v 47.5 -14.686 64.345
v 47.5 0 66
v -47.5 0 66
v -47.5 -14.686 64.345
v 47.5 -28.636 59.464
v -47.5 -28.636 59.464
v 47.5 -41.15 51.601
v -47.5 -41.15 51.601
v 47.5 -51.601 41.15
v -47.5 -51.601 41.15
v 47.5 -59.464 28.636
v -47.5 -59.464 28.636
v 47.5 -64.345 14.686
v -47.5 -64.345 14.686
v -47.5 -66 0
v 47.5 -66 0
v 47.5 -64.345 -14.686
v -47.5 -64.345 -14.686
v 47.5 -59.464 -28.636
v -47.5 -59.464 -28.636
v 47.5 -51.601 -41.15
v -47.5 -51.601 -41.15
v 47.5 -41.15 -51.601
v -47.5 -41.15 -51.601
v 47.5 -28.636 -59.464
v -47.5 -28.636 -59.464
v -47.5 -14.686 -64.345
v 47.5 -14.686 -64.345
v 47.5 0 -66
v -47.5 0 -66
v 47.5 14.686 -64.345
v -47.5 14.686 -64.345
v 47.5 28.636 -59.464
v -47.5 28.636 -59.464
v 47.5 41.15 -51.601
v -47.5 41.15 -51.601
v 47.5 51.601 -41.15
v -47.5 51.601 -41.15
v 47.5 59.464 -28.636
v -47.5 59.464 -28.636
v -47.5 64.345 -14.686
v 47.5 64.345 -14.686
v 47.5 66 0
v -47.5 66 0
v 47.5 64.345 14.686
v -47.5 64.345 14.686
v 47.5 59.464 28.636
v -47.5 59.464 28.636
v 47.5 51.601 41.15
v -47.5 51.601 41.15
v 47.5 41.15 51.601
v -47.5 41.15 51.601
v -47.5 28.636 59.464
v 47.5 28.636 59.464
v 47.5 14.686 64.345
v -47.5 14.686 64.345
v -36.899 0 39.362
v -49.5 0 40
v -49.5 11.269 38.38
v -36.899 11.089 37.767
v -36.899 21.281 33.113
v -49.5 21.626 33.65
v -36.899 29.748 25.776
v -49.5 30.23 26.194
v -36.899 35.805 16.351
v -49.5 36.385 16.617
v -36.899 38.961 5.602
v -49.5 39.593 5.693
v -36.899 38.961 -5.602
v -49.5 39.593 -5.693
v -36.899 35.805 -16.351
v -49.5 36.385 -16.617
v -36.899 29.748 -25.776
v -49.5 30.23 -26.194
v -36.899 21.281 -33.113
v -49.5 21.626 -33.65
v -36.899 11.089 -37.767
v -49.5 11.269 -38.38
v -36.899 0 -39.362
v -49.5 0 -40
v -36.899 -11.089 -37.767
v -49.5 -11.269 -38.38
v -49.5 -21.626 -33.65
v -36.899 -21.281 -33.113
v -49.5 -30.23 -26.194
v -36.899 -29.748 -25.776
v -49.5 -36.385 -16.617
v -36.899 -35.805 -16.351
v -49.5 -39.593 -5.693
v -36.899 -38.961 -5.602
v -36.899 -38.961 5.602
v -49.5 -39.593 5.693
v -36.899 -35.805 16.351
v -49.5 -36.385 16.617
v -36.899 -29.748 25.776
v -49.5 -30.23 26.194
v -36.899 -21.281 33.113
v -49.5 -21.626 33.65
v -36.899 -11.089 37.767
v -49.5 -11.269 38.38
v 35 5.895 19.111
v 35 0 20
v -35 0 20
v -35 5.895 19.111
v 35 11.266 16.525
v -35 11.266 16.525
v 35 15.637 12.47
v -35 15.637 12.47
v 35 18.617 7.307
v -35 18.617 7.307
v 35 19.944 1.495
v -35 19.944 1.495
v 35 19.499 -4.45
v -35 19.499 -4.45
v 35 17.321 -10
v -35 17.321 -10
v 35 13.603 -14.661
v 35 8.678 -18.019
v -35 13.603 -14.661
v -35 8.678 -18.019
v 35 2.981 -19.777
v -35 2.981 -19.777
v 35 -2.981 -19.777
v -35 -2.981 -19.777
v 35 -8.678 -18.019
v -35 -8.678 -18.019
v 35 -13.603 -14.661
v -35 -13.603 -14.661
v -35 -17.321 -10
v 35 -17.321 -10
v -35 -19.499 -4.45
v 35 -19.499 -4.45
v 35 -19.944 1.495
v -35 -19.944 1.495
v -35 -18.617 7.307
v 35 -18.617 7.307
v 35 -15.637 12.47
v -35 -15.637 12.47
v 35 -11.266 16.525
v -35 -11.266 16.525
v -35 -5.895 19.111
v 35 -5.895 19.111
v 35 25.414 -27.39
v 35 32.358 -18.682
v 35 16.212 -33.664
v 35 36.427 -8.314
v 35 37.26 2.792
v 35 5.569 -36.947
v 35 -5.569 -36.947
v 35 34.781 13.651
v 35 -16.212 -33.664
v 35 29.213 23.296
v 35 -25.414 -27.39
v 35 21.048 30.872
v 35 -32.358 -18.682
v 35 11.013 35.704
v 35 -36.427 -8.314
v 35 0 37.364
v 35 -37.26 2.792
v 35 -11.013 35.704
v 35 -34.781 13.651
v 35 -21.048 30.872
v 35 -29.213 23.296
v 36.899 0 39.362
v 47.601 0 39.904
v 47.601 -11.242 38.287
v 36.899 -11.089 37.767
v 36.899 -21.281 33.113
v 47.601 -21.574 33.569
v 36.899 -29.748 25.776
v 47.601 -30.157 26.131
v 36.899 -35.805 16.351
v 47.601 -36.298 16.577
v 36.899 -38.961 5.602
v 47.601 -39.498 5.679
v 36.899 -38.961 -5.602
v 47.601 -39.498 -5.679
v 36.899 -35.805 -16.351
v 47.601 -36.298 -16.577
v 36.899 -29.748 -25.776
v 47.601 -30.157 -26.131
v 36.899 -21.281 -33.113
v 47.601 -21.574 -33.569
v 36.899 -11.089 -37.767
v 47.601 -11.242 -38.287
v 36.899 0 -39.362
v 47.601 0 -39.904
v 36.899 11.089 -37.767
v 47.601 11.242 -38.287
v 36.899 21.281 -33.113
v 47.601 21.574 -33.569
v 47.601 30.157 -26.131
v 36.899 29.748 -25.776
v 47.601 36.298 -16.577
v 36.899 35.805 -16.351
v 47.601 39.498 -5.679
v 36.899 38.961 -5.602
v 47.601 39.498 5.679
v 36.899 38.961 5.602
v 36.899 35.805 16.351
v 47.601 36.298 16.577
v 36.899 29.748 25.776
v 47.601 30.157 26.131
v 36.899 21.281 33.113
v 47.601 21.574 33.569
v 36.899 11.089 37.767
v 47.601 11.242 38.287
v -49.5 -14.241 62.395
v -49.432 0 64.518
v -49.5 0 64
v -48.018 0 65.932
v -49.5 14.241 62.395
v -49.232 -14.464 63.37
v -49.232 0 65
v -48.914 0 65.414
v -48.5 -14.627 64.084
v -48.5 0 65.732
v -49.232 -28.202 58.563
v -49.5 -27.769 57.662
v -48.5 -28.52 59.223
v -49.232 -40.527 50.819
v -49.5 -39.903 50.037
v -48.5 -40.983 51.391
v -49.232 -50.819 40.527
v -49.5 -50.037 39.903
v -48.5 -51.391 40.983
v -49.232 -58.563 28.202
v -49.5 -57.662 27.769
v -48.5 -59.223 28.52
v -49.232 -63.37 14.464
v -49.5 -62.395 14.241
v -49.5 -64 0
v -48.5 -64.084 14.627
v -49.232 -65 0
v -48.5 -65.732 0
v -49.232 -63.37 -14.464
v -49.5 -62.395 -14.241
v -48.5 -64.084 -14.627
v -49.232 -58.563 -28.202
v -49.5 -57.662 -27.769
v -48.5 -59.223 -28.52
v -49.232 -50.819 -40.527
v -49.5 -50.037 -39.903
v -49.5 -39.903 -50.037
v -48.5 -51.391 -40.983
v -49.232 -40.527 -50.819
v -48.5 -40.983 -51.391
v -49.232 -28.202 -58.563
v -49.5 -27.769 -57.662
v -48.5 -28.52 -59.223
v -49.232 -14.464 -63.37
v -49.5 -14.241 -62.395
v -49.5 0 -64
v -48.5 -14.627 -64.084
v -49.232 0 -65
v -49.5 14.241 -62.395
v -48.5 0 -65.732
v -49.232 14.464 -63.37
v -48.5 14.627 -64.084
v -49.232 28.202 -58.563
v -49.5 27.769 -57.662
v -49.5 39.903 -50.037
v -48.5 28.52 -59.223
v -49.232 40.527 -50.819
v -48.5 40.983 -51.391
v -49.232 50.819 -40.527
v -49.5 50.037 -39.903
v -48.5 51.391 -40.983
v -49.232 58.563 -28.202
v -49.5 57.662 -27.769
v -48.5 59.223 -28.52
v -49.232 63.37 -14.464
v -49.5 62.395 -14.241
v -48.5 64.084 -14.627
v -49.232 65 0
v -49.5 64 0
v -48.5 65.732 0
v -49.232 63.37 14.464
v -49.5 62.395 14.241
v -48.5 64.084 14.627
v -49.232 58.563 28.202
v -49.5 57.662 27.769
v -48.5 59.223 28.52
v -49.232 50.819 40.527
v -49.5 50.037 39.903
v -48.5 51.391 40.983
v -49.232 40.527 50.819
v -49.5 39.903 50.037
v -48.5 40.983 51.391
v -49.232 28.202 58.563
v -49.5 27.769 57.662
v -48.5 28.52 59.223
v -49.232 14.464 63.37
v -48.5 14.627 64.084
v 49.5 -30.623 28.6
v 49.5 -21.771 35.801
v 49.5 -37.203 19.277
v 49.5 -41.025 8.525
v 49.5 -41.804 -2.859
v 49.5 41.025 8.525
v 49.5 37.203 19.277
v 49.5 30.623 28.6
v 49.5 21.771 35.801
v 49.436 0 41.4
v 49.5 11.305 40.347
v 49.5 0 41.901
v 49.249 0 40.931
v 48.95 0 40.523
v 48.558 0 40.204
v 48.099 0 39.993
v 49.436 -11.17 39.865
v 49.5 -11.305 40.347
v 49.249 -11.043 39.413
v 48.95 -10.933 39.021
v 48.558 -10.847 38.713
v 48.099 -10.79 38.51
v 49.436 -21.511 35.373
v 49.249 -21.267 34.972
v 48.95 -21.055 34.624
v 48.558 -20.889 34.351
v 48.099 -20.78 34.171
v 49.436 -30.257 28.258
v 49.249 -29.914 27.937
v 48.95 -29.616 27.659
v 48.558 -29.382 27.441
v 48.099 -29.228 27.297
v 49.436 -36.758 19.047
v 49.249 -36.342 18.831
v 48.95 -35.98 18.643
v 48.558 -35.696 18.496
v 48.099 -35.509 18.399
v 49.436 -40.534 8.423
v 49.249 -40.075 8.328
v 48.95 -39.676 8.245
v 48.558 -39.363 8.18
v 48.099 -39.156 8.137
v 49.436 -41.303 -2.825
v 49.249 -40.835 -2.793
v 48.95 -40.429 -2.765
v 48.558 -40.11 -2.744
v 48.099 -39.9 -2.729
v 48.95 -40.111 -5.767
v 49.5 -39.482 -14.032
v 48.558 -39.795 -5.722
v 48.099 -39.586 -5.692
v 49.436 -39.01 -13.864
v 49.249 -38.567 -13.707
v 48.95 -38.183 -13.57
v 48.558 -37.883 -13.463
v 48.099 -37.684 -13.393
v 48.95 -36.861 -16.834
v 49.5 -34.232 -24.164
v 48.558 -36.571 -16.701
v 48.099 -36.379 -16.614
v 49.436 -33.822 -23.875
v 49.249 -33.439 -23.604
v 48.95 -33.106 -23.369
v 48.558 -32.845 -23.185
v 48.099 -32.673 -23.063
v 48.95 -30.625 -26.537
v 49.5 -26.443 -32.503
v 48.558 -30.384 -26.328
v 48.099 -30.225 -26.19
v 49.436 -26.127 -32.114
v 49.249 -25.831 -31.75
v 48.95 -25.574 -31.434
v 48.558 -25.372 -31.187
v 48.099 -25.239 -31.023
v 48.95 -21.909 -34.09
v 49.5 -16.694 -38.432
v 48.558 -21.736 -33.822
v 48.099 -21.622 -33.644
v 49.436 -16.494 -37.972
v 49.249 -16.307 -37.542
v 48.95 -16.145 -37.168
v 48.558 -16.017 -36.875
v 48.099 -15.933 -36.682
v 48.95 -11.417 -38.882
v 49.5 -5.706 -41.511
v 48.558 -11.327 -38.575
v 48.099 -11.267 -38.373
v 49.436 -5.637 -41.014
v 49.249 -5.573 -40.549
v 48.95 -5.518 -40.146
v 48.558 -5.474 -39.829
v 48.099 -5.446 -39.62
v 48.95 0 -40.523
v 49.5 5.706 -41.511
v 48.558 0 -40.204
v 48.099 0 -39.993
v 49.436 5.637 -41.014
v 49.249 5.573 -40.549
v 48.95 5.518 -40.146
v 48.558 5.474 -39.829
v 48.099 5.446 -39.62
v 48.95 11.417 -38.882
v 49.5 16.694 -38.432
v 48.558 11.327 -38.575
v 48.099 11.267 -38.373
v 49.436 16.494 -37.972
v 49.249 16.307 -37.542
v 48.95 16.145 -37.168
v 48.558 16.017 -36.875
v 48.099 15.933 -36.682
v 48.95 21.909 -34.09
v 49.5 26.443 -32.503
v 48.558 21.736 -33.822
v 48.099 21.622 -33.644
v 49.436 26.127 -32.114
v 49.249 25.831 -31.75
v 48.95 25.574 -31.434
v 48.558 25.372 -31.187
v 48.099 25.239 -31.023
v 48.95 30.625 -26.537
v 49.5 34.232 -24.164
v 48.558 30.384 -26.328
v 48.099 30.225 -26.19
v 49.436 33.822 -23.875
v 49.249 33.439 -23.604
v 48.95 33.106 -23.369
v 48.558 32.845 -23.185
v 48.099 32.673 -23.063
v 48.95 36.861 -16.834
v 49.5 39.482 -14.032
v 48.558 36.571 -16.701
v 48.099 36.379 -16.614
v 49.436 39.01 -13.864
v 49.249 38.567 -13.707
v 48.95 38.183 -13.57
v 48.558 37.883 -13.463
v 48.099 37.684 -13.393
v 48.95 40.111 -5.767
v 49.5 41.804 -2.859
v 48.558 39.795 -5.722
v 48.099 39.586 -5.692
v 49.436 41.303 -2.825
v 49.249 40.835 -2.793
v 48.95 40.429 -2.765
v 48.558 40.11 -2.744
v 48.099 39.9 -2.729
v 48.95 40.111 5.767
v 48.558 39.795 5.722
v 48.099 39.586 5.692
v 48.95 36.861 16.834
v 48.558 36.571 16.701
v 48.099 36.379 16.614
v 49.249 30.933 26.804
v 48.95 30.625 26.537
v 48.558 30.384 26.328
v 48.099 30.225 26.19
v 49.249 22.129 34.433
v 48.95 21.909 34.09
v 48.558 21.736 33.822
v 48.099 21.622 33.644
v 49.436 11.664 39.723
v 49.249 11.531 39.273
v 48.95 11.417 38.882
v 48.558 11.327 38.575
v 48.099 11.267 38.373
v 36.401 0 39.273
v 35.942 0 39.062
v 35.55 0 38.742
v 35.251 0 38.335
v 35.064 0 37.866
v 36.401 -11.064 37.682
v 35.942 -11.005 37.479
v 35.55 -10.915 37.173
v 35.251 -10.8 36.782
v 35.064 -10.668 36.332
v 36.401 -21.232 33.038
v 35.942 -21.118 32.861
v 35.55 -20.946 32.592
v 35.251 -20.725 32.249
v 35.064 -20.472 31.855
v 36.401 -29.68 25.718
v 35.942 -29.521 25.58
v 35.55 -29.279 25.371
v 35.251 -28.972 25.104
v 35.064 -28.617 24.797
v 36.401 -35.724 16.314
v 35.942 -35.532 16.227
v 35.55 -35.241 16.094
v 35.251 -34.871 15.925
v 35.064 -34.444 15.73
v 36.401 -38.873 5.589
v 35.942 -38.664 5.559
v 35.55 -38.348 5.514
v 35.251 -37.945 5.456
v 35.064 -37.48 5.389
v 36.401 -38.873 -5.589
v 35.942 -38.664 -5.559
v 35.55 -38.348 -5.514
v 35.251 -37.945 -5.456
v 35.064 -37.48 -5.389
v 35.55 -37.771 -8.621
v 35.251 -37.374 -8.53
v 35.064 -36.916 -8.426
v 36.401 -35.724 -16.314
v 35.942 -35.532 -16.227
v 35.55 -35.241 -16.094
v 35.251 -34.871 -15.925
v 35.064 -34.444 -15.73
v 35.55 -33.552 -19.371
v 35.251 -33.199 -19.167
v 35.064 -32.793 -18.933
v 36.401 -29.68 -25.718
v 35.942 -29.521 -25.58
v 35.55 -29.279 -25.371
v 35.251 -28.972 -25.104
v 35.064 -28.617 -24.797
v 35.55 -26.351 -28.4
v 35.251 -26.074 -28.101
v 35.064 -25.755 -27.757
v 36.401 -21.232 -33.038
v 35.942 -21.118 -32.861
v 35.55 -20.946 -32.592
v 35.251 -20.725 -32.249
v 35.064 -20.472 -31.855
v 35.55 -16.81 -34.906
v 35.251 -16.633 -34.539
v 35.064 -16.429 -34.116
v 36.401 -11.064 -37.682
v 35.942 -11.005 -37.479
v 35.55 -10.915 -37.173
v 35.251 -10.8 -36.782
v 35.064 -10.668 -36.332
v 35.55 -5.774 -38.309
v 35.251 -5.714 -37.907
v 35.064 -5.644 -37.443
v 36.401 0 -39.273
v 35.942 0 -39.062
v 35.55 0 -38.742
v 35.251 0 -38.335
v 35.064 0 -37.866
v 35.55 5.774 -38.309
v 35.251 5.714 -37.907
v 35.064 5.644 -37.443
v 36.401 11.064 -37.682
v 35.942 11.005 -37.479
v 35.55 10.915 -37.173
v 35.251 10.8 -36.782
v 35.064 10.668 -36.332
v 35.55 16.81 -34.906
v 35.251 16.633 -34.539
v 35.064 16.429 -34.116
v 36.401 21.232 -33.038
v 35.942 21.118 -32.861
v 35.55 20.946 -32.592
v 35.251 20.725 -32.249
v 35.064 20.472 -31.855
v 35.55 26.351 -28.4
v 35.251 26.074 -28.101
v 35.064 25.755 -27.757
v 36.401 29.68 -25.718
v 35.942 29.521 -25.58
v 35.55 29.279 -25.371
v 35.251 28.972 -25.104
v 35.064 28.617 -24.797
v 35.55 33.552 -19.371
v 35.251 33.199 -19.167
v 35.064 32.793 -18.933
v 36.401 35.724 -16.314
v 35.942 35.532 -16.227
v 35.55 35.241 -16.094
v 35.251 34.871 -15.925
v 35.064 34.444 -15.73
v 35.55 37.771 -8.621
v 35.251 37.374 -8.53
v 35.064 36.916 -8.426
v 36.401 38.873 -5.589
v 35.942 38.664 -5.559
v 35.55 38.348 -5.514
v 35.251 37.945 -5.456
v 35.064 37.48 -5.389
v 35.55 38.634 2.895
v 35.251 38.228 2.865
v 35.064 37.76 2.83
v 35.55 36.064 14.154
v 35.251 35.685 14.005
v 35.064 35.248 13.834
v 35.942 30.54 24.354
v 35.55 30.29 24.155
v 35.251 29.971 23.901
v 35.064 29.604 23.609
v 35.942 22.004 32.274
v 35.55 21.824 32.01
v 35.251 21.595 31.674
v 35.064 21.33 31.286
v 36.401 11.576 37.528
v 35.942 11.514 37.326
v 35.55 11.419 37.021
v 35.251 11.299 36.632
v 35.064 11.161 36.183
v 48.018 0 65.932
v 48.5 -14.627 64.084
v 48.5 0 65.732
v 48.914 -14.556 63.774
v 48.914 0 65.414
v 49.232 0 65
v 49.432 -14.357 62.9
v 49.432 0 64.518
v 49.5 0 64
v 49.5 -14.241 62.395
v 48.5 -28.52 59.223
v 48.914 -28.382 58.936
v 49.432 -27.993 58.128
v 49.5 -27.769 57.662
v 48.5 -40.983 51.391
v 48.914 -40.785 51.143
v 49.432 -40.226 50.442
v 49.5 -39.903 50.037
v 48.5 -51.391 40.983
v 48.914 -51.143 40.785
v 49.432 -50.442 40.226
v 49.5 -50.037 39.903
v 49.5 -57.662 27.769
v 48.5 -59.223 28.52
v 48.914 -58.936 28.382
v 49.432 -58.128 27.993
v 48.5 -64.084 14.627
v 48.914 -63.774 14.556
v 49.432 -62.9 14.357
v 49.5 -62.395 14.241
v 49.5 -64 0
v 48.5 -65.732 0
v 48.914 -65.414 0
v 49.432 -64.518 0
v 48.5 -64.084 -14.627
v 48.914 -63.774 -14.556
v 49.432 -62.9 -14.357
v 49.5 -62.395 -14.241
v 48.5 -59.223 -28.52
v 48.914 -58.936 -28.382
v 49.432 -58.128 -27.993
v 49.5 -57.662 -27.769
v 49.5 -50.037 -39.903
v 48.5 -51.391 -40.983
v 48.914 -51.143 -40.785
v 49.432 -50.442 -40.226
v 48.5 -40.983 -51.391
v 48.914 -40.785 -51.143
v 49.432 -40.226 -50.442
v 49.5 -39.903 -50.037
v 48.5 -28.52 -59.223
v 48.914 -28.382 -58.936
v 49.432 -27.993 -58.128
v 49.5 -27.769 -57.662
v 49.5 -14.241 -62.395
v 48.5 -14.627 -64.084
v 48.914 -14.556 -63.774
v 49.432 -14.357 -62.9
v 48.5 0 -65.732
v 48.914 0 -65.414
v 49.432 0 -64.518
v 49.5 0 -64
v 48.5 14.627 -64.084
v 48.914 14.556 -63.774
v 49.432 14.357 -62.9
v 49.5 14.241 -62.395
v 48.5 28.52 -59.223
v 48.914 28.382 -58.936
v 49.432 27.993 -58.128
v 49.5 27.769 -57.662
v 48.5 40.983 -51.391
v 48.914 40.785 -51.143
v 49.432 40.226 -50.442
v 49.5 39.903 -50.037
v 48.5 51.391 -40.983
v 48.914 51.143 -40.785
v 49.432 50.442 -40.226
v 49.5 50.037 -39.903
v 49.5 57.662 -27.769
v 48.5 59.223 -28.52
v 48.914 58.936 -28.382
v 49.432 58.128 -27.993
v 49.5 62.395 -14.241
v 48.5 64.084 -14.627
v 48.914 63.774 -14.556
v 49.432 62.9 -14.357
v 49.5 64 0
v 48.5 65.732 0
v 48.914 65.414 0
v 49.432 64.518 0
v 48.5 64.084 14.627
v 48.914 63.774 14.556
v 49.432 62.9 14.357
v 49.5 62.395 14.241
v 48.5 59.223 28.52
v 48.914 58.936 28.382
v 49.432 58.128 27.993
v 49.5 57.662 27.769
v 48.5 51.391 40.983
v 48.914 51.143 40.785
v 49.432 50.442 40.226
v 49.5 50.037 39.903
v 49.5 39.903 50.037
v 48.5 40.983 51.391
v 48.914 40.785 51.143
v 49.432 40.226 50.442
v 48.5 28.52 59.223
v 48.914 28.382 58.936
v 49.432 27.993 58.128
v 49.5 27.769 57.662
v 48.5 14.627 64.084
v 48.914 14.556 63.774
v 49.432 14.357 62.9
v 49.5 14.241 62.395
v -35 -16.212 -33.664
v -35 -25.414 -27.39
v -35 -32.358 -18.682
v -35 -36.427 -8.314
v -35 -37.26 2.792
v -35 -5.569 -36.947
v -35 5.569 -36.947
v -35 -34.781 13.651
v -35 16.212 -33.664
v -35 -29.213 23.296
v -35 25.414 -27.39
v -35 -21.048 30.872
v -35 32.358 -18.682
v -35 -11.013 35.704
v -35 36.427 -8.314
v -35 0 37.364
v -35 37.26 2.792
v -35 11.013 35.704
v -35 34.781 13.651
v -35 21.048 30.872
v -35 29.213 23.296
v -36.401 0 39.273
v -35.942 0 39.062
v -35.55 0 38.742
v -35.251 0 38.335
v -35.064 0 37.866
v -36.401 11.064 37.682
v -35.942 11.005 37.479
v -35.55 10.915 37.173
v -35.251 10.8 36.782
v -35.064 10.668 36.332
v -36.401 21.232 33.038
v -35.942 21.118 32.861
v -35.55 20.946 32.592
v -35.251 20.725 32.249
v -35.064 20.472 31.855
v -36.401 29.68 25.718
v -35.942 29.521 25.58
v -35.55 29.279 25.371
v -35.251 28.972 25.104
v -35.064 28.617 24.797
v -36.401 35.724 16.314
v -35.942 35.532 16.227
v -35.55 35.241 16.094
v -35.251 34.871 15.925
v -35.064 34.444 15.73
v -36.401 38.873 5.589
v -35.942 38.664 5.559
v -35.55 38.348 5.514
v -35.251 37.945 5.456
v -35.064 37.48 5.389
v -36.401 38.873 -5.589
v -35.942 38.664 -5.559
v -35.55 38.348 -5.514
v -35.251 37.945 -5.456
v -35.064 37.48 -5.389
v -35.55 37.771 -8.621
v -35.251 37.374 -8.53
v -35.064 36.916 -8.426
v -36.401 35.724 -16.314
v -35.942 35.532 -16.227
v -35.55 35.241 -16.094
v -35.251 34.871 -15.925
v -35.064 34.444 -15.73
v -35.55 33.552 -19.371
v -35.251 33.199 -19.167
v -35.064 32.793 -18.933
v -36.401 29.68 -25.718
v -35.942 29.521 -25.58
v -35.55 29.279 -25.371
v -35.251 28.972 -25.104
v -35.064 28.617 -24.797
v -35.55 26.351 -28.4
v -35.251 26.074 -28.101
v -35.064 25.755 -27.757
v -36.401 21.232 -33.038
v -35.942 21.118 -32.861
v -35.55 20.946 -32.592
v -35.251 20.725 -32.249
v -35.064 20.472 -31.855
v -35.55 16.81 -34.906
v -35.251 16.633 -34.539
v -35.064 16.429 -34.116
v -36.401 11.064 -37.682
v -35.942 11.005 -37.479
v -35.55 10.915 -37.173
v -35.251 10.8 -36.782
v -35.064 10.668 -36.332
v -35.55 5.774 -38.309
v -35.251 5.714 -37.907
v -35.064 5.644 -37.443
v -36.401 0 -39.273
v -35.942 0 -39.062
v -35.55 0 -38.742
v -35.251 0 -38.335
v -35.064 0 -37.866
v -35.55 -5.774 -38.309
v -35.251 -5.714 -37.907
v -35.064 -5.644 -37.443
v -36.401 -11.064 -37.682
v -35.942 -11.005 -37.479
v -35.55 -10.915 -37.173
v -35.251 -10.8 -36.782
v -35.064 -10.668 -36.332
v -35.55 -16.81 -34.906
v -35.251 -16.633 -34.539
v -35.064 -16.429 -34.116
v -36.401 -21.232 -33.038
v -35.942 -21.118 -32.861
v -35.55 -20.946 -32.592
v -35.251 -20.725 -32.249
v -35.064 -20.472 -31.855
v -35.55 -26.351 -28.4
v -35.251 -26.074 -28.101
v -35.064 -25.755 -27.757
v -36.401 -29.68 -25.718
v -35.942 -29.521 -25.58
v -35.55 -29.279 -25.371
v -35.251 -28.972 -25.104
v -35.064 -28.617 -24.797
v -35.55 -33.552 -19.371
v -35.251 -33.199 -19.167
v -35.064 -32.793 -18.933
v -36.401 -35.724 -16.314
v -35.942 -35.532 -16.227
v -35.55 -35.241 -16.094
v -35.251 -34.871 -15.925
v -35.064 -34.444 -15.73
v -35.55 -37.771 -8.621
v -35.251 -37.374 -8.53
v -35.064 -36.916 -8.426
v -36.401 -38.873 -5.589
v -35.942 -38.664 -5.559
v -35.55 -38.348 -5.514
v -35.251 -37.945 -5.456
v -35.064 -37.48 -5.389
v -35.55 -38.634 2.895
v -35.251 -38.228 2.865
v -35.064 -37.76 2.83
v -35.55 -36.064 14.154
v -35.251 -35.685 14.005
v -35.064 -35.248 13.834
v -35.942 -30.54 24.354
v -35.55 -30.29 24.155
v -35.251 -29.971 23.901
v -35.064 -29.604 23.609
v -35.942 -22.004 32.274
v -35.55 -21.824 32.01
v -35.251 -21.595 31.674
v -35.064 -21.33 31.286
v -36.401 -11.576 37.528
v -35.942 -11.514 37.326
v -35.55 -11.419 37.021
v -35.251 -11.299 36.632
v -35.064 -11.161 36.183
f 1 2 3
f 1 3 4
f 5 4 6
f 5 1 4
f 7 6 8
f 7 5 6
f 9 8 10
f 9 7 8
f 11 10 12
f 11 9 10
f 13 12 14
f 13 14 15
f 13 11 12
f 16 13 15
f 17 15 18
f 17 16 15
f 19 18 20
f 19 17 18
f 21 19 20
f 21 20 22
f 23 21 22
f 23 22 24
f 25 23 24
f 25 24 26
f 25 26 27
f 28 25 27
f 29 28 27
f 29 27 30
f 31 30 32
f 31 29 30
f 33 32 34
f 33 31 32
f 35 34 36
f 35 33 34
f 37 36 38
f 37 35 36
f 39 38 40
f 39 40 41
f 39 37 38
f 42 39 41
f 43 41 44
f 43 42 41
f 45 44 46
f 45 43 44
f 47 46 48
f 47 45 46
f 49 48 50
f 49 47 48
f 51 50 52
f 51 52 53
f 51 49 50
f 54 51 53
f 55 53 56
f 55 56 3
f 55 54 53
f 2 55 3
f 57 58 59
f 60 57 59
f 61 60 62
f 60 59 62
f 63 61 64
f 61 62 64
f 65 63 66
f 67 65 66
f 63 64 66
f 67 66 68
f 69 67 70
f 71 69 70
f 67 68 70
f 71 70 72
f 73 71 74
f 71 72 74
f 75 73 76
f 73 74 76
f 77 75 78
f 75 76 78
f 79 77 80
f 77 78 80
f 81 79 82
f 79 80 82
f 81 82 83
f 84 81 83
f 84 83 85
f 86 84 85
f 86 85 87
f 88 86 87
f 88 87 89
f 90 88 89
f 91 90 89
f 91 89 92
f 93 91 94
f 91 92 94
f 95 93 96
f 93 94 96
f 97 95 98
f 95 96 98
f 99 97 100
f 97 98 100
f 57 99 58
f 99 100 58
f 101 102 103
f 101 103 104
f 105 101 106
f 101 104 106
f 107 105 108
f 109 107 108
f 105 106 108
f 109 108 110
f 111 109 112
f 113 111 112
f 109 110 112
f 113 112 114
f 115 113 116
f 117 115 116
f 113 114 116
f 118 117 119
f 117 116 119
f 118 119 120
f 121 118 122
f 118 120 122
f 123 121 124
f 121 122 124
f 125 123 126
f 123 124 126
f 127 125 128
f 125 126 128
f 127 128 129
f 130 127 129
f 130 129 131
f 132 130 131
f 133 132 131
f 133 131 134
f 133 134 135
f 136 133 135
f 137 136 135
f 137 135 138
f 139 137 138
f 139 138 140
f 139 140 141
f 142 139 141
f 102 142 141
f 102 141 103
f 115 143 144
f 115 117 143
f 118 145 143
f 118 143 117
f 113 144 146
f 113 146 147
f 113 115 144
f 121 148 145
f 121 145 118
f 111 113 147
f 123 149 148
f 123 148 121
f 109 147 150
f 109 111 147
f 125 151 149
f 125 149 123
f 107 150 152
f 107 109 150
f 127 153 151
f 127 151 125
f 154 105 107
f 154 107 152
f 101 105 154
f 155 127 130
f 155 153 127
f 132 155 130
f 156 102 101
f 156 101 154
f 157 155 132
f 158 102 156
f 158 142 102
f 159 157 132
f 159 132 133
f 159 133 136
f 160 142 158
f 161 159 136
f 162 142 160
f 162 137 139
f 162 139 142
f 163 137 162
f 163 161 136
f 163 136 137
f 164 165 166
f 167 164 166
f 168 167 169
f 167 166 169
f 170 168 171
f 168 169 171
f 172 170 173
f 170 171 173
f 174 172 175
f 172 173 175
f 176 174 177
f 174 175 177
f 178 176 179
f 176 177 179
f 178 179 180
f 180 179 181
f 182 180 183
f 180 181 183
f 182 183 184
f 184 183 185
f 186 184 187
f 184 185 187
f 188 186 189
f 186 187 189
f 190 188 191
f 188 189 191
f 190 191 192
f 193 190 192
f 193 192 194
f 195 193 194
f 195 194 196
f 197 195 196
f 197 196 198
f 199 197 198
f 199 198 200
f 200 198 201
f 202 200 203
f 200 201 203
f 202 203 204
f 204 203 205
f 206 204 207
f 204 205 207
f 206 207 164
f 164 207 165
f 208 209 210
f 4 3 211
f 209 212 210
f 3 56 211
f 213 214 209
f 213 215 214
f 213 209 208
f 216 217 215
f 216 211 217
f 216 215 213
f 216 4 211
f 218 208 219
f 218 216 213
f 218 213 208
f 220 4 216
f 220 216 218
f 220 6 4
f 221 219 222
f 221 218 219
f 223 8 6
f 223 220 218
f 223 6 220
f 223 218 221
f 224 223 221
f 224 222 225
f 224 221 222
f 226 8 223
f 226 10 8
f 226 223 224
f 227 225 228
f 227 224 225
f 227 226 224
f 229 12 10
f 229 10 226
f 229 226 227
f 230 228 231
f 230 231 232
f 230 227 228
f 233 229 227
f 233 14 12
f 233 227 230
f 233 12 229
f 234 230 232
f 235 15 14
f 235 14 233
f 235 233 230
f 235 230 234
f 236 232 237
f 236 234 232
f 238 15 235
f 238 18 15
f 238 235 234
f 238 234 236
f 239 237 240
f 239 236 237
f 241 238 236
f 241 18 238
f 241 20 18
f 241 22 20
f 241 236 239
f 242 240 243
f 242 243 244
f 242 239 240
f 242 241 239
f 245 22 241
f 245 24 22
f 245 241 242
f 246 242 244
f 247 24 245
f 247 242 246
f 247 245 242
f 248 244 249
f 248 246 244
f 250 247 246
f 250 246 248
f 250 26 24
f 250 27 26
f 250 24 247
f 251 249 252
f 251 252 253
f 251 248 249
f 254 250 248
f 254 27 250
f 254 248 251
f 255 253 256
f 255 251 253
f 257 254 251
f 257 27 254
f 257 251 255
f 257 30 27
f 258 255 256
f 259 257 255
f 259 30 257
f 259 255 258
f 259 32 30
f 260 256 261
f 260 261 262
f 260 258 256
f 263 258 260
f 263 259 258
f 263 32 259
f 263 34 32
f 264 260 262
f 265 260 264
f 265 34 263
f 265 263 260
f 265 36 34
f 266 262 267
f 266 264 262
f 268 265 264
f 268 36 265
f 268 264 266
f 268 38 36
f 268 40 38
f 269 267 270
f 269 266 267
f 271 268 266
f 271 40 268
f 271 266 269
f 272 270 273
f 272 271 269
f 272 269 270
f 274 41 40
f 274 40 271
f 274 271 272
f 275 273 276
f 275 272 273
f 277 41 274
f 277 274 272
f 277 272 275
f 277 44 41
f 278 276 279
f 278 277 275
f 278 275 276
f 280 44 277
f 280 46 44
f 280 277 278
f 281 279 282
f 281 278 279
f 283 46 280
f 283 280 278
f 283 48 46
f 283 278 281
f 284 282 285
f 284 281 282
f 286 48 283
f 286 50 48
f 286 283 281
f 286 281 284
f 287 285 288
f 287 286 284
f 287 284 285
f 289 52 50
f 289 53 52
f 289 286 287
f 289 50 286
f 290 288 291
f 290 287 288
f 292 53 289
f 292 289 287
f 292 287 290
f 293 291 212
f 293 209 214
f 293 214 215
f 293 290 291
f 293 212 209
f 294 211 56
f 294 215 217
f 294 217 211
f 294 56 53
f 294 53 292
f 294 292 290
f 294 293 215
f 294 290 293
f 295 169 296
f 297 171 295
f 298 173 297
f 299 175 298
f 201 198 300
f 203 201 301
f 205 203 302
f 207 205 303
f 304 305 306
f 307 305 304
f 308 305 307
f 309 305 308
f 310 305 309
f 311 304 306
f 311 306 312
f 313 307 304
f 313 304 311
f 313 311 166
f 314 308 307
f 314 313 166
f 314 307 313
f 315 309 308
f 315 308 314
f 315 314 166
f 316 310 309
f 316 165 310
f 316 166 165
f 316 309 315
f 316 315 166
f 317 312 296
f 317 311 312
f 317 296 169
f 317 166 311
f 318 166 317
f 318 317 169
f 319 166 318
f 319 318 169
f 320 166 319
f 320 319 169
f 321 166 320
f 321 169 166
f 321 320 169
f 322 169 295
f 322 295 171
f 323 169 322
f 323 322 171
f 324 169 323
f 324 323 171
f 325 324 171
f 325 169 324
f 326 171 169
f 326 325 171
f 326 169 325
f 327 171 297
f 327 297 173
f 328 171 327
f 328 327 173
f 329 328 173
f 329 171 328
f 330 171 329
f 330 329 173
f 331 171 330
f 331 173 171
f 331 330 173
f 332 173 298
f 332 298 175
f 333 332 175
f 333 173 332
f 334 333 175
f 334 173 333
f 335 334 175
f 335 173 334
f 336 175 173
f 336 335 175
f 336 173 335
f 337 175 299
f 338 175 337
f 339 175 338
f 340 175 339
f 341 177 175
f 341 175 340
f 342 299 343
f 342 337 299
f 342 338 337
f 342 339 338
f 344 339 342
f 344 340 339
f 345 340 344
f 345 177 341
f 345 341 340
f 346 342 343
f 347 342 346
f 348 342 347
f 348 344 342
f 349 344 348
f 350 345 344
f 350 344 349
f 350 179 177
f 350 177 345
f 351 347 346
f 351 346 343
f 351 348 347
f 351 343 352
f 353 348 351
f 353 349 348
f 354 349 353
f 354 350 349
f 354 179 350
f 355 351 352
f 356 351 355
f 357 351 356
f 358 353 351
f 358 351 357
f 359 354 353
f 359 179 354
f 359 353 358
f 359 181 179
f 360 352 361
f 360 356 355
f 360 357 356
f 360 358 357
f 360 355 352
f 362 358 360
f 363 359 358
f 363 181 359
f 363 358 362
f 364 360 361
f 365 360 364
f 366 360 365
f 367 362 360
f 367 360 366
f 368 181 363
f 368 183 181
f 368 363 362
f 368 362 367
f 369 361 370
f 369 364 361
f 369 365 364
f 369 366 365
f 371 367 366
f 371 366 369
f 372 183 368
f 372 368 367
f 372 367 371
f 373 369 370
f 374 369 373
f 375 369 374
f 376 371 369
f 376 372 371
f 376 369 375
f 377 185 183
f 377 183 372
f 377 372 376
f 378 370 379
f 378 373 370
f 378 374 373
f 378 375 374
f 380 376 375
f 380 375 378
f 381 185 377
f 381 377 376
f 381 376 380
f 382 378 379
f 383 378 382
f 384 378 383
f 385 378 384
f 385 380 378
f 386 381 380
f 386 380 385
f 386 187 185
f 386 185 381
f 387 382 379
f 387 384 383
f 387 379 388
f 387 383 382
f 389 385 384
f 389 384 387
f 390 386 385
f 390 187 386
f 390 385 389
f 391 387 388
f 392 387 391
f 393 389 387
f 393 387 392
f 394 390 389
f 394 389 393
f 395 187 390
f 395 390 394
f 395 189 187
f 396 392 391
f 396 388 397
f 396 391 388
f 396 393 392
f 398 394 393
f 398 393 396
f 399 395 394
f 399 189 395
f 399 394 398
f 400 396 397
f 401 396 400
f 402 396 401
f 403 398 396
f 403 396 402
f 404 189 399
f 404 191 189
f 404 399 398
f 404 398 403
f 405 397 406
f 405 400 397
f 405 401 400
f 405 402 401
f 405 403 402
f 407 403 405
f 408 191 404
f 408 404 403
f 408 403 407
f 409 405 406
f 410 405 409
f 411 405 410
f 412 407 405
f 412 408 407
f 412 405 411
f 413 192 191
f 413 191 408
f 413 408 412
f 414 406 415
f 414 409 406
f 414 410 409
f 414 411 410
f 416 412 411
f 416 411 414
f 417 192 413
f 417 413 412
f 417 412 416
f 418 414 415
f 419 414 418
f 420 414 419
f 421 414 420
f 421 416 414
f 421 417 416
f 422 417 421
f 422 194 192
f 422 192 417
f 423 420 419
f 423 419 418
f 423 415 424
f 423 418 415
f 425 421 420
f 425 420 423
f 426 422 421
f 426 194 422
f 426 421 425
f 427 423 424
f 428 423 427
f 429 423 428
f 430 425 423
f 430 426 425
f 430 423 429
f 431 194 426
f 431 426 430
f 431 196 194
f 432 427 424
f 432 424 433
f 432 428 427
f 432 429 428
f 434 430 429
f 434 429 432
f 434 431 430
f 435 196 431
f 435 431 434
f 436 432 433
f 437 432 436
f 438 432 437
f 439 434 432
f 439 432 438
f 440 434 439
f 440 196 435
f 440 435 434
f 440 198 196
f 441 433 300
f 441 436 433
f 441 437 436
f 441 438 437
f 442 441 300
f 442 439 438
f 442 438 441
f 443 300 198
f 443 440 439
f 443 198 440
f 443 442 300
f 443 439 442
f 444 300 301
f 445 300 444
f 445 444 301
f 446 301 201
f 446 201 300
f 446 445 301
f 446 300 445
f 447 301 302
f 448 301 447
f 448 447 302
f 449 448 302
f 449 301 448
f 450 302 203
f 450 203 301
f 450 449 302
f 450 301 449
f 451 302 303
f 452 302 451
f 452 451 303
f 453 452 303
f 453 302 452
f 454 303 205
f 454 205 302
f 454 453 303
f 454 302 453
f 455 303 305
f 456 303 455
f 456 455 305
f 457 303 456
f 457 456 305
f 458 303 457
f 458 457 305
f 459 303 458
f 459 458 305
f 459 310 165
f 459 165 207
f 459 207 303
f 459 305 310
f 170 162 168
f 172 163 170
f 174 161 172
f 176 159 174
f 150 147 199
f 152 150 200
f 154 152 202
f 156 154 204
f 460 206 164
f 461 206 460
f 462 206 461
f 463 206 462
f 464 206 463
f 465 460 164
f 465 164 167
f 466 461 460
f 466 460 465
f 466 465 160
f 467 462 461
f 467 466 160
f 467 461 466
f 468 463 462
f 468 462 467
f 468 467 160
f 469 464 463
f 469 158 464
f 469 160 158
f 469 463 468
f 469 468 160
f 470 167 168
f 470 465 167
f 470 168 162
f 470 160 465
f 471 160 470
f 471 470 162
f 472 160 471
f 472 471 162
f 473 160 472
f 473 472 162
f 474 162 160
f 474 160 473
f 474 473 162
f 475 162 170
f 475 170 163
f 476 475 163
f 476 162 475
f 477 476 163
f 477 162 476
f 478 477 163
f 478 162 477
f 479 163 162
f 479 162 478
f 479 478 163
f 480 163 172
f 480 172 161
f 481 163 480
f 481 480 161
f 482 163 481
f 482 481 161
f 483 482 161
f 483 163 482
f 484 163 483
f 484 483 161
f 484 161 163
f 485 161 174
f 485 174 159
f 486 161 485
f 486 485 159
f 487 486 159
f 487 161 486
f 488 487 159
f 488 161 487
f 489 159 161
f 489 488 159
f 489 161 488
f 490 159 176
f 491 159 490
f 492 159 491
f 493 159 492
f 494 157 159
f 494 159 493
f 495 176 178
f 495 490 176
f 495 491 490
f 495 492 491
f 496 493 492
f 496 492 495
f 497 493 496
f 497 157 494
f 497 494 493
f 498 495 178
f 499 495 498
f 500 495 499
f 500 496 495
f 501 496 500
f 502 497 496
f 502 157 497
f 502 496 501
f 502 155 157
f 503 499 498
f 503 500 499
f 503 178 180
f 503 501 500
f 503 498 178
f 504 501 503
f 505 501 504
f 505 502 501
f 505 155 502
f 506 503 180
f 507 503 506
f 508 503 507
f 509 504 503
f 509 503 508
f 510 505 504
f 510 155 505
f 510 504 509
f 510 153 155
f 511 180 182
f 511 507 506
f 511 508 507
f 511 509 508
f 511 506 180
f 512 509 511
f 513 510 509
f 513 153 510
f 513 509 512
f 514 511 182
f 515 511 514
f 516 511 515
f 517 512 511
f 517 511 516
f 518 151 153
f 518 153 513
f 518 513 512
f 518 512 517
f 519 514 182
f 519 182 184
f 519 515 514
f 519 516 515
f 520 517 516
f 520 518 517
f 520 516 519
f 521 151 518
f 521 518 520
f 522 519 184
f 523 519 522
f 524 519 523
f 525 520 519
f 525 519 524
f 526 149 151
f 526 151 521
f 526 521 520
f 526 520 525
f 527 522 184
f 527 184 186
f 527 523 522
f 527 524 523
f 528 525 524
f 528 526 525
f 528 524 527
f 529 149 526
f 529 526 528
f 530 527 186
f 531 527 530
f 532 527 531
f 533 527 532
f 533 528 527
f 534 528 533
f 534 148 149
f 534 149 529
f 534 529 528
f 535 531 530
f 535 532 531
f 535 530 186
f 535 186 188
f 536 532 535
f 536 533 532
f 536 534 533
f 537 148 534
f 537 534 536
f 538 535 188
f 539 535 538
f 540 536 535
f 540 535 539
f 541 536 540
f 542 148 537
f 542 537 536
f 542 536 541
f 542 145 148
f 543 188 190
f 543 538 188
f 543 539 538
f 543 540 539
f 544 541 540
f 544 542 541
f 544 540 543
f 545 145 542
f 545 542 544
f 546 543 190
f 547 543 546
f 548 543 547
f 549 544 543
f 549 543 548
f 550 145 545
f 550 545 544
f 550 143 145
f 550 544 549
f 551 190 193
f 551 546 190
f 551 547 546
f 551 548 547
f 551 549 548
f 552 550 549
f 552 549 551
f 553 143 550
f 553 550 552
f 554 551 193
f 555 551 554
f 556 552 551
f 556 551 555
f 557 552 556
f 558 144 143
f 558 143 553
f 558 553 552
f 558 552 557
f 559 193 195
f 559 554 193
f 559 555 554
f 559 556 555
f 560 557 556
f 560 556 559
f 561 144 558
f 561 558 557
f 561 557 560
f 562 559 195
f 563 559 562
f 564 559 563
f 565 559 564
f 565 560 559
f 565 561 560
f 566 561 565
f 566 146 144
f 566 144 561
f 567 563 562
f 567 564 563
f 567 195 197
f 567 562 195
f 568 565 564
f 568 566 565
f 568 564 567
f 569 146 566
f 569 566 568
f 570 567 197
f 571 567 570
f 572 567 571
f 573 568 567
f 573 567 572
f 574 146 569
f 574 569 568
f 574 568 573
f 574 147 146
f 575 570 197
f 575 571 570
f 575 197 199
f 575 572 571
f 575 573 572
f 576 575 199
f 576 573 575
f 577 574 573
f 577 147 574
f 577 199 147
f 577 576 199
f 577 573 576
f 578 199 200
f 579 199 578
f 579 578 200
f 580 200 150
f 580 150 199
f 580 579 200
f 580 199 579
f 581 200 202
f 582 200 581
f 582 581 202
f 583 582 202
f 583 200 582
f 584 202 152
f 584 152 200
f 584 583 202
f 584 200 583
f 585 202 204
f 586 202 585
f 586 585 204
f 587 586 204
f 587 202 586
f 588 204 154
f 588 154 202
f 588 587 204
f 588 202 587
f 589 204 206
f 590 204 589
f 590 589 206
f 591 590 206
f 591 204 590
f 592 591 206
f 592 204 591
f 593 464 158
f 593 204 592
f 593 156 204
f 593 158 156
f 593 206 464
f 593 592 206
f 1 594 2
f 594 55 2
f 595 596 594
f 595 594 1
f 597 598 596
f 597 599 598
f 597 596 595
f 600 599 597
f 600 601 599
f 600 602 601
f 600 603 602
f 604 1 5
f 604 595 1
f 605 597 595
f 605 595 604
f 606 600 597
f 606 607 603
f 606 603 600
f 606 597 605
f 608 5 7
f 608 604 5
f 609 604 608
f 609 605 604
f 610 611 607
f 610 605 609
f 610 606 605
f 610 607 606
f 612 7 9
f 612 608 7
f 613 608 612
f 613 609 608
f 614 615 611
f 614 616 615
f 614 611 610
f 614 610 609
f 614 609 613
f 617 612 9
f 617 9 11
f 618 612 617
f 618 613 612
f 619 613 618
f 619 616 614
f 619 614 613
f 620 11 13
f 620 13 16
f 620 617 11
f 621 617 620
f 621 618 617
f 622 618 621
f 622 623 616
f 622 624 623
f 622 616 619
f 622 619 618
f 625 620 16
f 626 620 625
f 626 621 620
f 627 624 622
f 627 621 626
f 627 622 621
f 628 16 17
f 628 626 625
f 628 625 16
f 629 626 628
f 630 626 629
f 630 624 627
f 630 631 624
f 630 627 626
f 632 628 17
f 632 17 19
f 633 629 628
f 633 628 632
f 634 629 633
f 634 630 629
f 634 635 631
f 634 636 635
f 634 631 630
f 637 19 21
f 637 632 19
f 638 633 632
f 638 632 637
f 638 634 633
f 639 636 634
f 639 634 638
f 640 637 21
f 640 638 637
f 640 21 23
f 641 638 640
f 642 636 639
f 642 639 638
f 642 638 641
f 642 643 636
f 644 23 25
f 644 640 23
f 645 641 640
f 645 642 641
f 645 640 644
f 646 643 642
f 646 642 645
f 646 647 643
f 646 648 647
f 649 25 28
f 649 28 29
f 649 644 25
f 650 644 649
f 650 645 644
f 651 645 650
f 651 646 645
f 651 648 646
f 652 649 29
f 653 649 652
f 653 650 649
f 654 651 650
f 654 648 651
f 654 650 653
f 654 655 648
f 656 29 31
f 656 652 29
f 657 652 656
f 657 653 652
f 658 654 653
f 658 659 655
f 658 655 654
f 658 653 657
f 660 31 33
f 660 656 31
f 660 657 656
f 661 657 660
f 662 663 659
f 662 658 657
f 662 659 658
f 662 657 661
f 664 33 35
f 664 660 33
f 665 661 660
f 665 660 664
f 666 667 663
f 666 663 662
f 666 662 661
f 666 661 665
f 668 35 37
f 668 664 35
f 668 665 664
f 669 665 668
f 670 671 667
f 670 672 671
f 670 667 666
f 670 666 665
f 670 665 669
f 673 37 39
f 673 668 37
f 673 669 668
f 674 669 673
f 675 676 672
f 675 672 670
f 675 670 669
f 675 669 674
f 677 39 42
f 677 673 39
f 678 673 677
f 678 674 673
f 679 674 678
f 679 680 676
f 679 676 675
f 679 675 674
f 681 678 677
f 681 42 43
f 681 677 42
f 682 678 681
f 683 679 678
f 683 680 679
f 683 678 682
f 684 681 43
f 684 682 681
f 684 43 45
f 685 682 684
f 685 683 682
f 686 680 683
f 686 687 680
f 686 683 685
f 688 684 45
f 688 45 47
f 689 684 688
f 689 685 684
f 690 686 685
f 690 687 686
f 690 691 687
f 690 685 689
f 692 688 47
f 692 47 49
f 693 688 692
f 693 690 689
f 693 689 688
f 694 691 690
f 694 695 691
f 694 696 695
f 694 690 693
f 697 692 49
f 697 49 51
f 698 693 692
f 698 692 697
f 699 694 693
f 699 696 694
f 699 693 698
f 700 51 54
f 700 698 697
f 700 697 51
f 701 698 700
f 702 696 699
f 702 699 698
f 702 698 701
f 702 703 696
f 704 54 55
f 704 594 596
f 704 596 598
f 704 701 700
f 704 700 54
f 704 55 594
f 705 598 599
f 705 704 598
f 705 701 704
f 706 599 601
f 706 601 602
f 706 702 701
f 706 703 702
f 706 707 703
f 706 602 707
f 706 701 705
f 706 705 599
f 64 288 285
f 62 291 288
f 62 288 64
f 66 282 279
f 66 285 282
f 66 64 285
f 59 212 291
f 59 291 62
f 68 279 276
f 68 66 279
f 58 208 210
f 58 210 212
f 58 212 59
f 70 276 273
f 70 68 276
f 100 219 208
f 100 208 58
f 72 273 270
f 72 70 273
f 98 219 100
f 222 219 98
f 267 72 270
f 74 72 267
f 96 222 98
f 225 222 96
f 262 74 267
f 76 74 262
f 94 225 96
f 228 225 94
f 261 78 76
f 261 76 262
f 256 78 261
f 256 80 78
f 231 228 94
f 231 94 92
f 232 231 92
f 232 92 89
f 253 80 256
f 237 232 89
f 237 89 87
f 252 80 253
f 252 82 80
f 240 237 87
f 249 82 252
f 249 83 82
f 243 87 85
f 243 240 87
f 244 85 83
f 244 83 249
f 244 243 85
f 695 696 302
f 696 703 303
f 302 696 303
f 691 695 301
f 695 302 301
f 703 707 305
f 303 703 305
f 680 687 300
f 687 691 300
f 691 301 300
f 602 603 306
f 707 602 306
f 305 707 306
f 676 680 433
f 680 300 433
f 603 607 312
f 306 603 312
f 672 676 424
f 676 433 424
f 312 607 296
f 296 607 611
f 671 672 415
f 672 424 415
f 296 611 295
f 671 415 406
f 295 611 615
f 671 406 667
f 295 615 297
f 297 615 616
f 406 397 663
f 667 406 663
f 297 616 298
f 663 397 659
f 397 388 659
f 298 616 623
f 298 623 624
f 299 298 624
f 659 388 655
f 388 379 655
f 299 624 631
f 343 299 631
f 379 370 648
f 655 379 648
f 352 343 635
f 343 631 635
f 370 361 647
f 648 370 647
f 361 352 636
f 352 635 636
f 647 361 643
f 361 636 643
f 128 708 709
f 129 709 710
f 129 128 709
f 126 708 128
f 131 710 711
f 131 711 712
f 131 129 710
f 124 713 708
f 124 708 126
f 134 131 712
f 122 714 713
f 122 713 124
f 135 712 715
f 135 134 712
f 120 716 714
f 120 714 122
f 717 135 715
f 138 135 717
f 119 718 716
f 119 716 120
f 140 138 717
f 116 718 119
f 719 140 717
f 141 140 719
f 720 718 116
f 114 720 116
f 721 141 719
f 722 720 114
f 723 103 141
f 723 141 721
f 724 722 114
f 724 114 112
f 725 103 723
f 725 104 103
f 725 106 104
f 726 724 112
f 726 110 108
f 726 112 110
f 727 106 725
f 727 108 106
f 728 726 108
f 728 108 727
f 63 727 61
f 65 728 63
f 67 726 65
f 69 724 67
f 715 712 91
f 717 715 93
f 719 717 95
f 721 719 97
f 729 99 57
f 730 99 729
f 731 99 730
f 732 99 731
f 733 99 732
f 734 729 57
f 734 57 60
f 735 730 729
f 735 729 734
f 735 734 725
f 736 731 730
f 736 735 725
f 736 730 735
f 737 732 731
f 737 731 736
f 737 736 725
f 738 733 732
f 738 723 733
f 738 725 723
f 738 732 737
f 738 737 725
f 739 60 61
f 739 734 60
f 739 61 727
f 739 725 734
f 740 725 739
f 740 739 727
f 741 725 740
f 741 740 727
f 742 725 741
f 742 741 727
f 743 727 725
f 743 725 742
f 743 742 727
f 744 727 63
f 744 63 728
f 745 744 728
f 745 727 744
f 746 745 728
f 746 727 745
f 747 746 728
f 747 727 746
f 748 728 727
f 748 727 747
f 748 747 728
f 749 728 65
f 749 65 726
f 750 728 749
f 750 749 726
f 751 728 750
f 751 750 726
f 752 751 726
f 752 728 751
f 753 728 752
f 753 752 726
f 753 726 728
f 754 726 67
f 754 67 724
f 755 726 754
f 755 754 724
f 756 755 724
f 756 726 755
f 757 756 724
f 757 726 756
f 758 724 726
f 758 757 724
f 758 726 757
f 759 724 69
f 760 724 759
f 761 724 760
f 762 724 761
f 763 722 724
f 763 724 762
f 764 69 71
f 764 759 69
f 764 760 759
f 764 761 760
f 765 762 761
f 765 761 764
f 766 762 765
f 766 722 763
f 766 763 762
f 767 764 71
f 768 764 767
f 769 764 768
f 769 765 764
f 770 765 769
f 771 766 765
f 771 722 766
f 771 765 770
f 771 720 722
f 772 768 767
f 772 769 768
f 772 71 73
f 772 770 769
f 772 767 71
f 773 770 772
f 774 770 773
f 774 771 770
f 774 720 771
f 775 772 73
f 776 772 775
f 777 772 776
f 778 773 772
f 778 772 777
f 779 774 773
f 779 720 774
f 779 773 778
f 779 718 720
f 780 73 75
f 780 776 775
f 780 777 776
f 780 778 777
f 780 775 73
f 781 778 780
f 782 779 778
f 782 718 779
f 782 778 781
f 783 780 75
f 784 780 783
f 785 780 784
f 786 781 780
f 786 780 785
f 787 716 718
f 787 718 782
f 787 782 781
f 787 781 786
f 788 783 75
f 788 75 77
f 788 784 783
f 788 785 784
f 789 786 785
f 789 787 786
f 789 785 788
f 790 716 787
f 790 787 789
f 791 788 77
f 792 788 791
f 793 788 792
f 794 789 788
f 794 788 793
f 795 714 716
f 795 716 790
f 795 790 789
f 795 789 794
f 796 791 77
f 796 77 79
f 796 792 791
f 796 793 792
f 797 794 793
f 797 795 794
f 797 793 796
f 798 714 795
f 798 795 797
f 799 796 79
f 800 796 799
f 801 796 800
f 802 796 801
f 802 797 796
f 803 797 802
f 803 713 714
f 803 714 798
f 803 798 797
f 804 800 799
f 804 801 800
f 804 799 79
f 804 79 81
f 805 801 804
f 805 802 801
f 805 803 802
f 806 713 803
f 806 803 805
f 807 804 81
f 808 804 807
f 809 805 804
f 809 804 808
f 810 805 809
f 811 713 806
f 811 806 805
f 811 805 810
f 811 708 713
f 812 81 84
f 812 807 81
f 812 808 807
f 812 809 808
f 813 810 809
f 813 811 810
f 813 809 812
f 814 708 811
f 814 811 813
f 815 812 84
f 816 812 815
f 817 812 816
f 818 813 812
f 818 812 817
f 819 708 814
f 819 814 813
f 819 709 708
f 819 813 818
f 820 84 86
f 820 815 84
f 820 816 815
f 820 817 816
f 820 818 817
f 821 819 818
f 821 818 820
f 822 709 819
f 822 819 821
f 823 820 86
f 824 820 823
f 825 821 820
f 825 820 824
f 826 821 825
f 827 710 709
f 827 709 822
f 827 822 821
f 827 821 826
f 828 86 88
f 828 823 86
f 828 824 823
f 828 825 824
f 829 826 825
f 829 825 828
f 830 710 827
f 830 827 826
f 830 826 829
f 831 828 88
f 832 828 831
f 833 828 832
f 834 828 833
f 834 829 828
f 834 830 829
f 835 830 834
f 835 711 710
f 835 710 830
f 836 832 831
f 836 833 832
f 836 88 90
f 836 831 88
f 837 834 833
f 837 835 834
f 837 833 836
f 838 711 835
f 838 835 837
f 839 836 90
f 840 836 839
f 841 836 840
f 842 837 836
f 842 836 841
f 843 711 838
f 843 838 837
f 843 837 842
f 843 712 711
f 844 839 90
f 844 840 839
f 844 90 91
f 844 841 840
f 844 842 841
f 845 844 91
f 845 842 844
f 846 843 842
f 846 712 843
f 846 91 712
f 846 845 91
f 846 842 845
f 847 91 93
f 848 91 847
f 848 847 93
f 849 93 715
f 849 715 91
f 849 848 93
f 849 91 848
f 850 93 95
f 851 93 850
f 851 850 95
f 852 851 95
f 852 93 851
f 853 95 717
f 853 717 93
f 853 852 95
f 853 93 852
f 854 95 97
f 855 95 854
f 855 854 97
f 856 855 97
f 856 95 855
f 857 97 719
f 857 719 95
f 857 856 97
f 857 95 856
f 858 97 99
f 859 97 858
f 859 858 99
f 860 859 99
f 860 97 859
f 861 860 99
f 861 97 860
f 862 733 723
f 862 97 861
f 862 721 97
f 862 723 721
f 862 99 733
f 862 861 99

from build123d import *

# Parameters (mm, degrees)
SKETCH_1_W               = 99
SKETCH_1_H               = 66
SKETCH_2_R               = 40
CUT_EXTRUDE_1_DEPTH      = 14.5
CUT_EXTRUDE_1_DRAFT      = -2.9
MIRROR_1_COPY_1_SKETCH_R = 40
MIRROR_1_COPY_1_DEPTH    = 14.5
MIRROR_1_COPY_1_DRAFT    = -2.9
FILLET_1_R               = 2
SKETCH_3_R               = 20
CUT_EXTRUDE_2_DEPTH      = 100


with BuildPart() as part:
    # 草图1 → 旋转2 (revolve)
    with BuildSketch(Plane.XY):
        with Locations((0, 33)):
            Rectangle(SKETCH_1_W, SKETCH_1_H)
    revolve(axis=Axis((-49.5, 0, 0), (1, 0, 0)))


with BuildPart() as cut_extrude_1_tool:
    # 草图2 → 切除-拉伸1 (with draft: the straight prism first)
    with BuildSketch(Plane.ZY.offset(49.5)):
        Circle(SKETCH_2_R)
    extrude(amount=-CUT_EXTRUDE_1_DEPTH)
    # 切除-拉伸1: the draft: its side faces are tilted about the plane it starts from
    cut_extrude_1_sides = [cut_extrude_1_tool.faces().sort_by_distance(p)[0] for p in [
        (-42.25, 0, -40),
    ]]
    draft(cut_extrude_1_sides, Plane.ZY.offset(49.5), CUT_EXTRUDE_1_DRAFT)


with BuildPart() as part_1:
    add(part.part)

    # 切除-拉伸1: cut by cut_extrude_1_tool
    add(cut_extrude_1_tool.part, mode=Mode.SUBTRACT)


with BuildPart() as mirror_1_copy_1_tool:
    # 镜向1 copy 1 sketch → 镜向1 copy 1 (with draft: the straight prism first)
    with BuildSketch(Plane(origin=(49.5, 0, 0), x_dir=(0, 0, 1), z_dir=(1, 0, 0))):
        Circle(MIRROR_1_COPY_1_SKETCH_R)
    extrude(amount=-MIRROR_1_COPY_1_DEPTH)
    # 镜向1 copy 1: the draft: its side faces are tilted about the plane it starts from
    mirror_1_copy_1_sides = [mirror_1_copy_1_tool.faces().sort_by_distance(p)[0] for p in [
        (42.25, 0, -40),
    ]]
    draft(mirror_1_copy_1_sides, Plane(origin=(49.5, 0, 0), x_dir=(0, 0, 1), z_dir=(1, 0, 0)), MIRROR_1_COPY_1_DRAFT)


with BuildPart() as part_2:
    add(part_1.part)

    # 镜向1 copy 1: cut by mirror_1_copy_1_tool
    add(mirror_1_copy_1_tool.part, mode=Mode.SUBTRACT)

    # 圆角1
    fillet_1_edges = [part_2.edges().sort_by_distance(p)[0] for p in [
        (-49.5, -66, 0),
        (35, 0, -39.265461688),
        (49.5, 0, -40),
        (49.5, -66, 0),
        (-35, 0, -39.265461688),
    ]]
    fillet(fillet_1_edges, radius=FILLET_1_R)

    # 草图3 → 切除-拉伸2 (cut)
    with BuildSketch(Plane.ZY.offset(35)):
        Circle(SKETCH_3_R)
    extrude(amount=-CUT_EXTRUDE_2_DEPTH, mode=Mode.SUBTRACT)


solid = part_2.part
